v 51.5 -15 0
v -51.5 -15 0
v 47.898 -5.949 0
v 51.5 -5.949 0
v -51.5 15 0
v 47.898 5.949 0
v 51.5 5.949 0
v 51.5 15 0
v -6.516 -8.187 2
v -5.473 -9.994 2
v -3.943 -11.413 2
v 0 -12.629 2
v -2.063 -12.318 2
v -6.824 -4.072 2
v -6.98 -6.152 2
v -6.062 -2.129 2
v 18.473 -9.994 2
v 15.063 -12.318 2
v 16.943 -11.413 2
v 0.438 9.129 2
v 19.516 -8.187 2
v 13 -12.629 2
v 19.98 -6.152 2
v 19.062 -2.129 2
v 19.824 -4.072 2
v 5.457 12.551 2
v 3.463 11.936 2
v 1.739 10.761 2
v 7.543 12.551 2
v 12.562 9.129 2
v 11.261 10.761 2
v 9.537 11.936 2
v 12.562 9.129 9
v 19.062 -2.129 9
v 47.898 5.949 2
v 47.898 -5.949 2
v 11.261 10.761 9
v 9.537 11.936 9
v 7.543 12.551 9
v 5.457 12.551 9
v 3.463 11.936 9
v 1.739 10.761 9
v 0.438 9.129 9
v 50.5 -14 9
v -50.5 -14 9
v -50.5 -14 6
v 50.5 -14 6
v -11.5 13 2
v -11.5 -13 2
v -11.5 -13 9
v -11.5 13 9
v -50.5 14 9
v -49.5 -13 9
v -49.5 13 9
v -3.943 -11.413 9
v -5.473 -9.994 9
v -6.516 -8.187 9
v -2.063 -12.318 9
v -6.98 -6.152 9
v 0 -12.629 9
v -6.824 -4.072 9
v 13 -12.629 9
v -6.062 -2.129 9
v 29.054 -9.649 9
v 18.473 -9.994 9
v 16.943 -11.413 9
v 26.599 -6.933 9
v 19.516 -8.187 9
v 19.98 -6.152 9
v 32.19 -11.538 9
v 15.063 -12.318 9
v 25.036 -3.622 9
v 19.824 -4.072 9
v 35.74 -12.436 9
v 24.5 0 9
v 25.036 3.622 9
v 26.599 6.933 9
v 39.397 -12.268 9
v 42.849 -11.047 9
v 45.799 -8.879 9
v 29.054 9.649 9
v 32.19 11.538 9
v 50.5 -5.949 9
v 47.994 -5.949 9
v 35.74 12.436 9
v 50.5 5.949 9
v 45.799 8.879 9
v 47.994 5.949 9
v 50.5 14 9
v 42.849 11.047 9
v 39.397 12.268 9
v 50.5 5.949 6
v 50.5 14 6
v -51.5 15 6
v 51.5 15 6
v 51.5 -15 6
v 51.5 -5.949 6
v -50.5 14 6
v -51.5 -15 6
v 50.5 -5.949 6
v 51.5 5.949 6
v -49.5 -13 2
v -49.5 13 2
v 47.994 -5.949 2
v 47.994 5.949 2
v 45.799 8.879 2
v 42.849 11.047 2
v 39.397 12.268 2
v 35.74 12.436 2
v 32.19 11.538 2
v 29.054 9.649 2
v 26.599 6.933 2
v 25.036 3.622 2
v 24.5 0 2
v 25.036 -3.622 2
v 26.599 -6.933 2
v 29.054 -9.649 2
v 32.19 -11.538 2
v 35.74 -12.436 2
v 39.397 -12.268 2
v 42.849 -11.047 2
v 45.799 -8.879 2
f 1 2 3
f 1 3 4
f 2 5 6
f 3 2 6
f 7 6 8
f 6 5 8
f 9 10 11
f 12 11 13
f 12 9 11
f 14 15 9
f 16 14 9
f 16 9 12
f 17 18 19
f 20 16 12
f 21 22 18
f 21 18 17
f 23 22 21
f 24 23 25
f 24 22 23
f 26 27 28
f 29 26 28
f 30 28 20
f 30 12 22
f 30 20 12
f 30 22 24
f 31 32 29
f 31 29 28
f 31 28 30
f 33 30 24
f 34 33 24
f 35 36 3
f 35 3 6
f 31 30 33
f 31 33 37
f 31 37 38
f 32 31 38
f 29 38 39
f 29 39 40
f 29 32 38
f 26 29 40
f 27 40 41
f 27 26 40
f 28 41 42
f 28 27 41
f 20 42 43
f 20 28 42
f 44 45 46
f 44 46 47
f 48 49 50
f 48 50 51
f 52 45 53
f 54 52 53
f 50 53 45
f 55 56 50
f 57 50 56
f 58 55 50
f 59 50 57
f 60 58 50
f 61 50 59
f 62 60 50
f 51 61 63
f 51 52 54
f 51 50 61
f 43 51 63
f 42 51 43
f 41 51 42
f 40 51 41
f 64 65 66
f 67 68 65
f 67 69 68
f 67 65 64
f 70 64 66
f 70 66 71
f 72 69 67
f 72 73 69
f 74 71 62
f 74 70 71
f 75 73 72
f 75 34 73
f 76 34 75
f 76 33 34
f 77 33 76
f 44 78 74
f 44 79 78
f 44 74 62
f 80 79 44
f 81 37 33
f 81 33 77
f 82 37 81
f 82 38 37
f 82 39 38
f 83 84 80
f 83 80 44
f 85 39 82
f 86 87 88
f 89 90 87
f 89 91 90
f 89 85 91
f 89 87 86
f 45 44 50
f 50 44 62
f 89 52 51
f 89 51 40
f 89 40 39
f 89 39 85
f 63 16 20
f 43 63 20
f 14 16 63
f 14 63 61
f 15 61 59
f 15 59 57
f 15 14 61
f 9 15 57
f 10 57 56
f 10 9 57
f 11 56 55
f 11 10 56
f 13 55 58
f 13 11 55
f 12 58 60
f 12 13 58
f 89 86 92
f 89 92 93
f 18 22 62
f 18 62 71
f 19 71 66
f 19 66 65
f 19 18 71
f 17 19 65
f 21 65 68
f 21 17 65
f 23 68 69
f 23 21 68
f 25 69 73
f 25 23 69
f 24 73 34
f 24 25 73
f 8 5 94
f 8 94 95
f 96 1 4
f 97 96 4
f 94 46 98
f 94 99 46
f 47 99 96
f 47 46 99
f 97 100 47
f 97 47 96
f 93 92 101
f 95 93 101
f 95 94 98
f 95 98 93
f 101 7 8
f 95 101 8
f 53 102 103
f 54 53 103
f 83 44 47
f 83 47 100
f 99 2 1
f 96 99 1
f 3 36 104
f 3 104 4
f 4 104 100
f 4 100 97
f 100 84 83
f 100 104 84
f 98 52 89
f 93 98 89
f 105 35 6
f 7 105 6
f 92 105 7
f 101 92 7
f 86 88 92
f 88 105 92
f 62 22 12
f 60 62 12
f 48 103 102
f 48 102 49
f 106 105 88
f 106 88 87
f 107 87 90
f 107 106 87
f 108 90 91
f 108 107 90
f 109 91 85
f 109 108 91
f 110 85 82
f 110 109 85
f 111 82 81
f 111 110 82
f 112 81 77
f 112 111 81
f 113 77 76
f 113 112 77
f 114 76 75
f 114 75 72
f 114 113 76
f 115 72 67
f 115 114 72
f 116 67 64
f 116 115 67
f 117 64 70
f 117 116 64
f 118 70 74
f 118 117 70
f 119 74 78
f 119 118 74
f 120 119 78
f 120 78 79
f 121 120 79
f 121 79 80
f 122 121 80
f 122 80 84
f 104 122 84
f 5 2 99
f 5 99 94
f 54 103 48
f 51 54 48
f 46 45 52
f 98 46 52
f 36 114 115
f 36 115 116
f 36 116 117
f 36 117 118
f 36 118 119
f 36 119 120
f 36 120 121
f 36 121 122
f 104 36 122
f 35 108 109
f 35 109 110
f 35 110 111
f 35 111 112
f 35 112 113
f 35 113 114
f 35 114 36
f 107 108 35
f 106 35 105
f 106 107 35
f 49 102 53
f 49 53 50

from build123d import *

# Parameters (mm, degrees)
SKETCH002_W     = 103
SKETCH002_H     = 30
PAD002_DEPTH    = 9
SKETCH003_R     = 12.5
SKETCH003_W     = 38
SKETCH003_H     = 26
POCKET_DEPTH    = 7
SKETCH004_W     = 103
SKETCH004_H     = 30
SKETCH004_W_2   = 101
SKETCH004_H_2   = 28
POCKET001_DEPTH = 3
SKETCH007_W     = 3.602402
SKETCH007_H     = 11.897104
POCKET003_DEPTH = 10


with BuildPart() as part:
    # Sketch002 → Pad002 (new body)
    with BuildSketch(Plane.XY):
        Rectangle(SKETCH002_W, SKETCH002_H)
    extrude(amount=PAD002_DEPTH)

    # Sketch003 (on Pad) → Pocket (cut)
    with BuildSketch(Plane.XY.offset(2)):
        with Locations((37, 0)):
            Circle(SKETCH003_R)
        with Locations((-30.5, 0)):
            Rectangle(SKETCH003_W, SKETCH003_H)
        with BuildLine():
            ThreePointArc((12.562178, 9.129165), (6.5, 12.629165), (0.437822, 9.129165))
            Line((-6.062178, -2.129165), (0.437822, 9.129165))
            ThreePointArc((-6.062178, -2.129165), (-6.062178, -9.129165), (0, -12.629165))
            Line((13, -12.629165), (0, -12.629165))
            ThreePointArc((13, -12.629165), (19.062178, -9.129165), (19.062178, -2.129165))
            Line((12.562178, 9.129165), (19.062178, -2.129165))
        make_face()
    extrude(amount=POCKET_DEPTH, mode=Mode.SUBTRACT)

    # Sketch004 (on Face5 of Pocket) → Pocket001 (cut)
    with BuildSketch(Plane.XY.offset(9)):
        Rectangle(SKETCH004_W, SKETCH004_H)
        Rectangle(SKETCH004_W_2, SKETCH004_H_2, mode=Mode.SUBTRACT)
    extrude(amount=-POCKET001_DEPTH, mode=Mode.SUBTRACT)

    # Sketch007 (on Face11 of Pocket001) → Pocket003 (cut)
    with BuildSketch(Plane.XY.offset(9)):
        with Locations((49.698799, 0)):
            Rectangle(SKETCH007_W, SKETCH007_H)
    extrude(amount=-POCKET003_DEPTH, mode=Mode.SUBTRACT)


solid = part.part
